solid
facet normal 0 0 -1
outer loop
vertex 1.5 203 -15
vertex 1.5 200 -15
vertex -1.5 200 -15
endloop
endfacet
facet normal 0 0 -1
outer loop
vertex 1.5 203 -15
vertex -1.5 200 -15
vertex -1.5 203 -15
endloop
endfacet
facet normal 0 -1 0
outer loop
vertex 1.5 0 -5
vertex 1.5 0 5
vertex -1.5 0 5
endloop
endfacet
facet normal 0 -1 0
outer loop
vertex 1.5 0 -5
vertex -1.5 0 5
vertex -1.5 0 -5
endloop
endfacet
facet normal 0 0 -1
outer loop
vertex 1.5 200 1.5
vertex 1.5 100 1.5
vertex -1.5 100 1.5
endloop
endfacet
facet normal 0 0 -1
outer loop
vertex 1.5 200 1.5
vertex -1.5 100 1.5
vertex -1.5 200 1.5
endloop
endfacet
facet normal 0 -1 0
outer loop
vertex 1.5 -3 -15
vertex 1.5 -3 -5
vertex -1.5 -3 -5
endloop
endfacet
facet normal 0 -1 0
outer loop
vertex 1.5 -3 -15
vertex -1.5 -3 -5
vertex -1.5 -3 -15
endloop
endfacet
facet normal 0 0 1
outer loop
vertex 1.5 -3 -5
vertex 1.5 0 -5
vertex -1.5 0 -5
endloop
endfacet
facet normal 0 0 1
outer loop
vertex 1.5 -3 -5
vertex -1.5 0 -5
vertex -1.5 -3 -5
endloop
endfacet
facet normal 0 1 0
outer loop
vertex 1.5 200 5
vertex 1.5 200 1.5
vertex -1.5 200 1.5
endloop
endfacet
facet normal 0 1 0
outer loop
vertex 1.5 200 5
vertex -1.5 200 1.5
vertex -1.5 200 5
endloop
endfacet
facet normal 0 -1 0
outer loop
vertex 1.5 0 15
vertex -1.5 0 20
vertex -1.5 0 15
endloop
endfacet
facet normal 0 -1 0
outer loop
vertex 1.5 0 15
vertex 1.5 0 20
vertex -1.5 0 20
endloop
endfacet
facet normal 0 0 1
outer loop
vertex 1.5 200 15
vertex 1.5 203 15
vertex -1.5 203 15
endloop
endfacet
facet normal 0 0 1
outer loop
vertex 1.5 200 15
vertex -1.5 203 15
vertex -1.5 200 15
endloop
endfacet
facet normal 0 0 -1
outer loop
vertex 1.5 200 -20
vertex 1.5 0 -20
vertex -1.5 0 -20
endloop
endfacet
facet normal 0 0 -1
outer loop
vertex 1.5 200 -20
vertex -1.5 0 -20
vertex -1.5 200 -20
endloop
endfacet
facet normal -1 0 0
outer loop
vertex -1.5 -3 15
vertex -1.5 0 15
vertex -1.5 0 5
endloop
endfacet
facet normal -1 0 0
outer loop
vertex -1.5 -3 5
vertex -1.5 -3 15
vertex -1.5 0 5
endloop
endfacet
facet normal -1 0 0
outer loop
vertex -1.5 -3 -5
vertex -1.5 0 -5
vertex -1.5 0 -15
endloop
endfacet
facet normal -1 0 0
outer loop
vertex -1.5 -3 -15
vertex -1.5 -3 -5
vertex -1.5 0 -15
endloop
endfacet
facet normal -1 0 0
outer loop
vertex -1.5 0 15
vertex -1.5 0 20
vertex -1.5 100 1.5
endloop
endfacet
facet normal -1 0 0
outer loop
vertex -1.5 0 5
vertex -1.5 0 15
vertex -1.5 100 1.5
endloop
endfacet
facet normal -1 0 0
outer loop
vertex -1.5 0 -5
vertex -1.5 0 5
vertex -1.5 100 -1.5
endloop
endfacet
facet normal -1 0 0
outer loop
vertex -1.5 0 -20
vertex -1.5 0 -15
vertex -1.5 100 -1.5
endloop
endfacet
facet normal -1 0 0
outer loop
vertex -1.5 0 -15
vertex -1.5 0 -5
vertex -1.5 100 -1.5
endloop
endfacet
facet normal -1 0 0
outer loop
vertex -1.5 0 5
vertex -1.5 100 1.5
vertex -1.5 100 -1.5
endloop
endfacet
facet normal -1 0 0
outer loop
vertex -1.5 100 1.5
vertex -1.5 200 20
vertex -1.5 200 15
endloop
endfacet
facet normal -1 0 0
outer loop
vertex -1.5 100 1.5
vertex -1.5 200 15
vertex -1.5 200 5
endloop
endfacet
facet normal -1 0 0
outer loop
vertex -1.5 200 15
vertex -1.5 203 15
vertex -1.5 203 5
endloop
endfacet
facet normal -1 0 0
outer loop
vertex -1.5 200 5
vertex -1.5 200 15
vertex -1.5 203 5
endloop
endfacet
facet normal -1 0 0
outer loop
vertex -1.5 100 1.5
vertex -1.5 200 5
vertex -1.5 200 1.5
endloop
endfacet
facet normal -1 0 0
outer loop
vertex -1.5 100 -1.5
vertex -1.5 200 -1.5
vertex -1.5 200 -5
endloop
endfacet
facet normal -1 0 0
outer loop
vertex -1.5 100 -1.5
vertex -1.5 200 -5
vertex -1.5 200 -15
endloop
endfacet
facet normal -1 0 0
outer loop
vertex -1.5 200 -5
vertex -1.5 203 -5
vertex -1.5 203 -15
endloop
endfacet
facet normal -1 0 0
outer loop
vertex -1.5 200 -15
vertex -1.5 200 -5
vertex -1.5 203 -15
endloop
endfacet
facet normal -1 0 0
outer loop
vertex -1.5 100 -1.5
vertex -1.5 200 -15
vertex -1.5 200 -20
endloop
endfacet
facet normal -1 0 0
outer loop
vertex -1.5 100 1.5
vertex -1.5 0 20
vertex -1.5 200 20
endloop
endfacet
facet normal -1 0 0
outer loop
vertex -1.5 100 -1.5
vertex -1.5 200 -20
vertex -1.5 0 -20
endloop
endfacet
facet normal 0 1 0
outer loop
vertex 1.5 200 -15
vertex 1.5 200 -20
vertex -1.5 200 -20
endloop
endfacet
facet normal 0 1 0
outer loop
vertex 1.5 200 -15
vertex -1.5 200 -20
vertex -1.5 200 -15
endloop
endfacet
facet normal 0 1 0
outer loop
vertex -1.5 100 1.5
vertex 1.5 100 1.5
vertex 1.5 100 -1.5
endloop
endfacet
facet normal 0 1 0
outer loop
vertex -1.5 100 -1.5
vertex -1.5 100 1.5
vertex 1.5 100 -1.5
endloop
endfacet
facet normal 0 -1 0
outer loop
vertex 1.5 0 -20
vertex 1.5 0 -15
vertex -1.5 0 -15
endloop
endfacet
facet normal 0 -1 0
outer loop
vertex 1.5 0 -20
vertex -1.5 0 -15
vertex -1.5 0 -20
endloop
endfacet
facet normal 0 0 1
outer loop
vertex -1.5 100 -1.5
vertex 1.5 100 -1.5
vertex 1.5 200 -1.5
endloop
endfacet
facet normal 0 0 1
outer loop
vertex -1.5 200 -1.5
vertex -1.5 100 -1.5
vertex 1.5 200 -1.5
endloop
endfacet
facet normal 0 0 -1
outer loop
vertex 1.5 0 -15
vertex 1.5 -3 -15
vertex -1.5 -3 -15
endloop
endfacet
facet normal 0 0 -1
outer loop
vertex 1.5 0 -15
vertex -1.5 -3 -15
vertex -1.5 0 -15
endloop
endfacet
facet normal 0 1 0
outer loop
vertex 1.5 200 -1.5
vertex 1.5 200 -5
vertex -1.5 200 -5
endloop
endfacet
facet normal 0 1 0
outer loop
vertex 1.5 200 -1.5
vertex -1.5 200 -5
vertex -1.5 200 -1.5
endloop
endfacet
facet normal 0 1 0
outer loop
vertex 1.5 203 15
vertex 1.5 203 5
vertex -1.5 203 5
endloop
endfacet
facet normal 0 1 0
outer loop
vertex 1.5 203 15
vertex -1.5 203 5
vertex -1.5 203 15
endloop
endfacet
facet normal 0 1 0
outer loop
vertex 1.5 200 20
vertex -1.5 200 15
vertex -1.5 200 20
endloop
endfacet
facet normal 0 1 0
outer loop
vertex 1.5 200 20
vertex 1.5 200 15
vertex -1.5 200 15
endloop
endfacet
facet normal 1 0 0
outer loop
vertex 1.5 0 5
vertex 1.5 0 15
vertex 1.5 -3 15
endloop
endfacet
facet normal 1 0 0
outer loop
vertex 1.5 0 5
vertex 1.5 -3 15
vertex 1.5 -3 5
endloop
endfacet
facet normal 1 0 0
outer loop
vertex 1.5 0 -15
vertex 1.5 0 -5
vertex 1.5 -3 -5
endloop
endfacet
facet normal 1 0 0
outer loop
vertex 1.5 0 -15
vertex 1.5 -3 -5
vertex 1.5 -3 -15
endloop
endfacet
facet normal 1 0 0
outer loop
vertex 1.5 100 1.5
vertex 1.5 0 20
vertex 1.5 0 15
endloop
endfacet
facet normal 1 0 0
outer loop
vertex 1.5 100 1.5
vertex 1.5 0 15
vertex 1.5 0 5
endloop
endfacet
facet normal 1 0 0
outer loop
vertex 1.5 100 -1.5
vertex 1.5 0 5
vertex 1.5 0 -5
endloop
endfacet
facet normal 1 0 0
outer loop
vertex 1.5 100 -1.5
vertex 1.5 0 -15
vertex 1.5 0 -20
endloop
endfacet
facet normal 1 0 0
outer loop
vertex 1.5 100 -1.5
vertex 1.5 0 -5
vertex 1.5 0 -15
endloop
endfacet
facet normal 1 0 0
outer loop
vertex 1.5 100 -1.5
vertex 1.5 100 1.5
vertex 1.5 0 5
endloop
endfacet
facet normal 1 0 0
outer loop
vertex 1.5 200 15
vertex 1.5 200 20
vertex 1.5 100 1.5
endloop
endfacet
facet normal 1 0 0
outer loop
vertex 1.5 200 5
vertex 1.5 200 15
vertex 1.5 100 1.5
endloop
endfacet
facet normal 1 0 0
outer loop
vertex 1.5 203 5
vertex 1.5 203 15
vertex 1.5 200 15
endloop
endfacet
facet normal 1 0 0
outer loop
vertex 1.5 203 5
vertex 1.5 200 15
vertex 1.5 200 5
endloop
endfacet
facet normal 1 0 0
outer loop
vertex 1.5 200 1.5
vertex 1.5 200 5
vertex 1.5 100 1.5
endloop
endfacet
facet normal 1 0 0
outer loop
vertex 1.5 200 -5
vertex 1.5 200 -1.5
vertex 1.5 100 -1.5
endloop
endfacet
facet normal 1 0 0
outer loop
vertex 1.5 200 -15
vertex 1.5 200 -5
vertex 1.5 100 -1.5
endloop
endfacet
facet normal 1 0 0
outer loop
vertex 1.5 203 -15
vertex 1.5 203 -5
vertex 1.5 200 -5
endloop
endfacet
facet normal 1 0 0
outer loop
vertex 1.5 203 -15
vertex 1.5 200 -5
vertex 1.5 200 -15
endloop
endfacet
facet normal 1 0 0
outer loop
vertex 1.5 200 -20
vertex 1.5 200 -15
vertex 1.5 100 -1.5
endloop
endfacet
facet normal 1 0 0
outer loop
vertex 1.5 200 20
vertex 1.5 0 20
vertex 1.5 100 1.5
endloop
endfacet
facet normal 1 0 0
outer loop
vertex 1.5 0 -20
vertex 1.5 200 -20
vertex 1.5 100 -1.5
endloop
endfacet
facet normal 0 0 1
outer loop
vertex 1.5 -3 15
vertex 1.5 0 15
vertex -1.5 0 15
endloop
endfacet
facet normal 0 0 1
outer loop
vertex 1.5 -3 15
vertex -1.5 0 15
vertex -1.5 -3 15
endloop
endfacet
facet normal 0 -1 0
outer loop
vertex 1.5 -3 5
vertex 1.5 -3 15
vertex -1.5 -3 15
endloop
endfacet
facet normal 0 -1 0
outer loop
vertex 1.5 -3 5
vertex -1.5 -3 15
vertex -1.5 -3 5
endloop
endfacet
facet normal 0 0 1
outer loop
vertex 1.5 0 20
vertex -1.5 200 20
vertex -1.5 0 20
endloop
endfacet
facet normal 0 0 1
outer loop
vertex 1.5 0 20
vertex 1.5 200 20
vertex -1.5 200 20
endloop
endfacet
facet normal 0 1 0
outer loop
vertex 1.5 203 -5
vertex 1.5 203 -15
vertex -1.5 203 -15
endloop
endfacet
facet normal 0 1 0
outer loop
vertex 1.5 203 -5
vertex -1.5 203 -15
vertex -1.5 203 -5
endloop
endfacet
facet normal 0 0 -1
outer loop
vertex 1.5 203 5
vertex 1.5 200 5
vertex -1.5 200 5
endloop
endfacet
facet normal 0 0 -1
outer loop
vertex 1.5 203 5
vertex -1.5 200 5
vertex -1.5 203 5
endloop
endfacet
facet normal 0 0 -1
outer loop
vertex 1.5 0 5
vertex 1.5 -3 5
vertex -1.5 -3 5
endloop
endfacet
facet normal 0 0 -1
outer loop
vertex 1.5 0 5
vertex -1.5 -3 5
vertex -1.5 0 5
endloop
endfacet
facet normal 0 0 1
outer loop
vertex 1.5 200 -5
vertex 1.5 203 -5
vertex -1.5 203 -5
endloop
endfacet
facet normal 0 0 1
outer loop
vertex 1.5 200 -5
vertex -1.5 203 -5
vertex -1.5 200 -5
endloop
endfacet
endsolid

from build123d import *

# Parameters (mm, degrees)
SALIENTE_EXTRUIR1_DEPTH = 1.5
CORTAR_EXTRUIR1_REACH   = 5
CROQUIS2_W              = 3
CROQUIS2_H              = 100


with BuildPart() as part:
    # Croquis1 → Saliente-Extruir1 (new body, symmetric)
    with BuildSketch(Plane(origin=(0, 0, 0), x_dir=(0, 0, -1), z_dir=(1, 0, 0))):
        Polygon((-20, 0), (-15, 0), (-15, -3), (-5, -3), (-5, 0), (5, 0), (5, -3), (15, -3), (15, 0), (20, 0), (20, 200), (15, 200), (15, 203), (5, 203), (5, 200), (-5, 200), (-5, 203), (-15, 203), (-15, 200), (-20, 200), align=None)
    extrude(amount=SALIENTE_EXTRUIR1_DEPTH, both=True)

    # Croquis2 → Cortar-Extruir1 (cut, up to next)
    with BuildSketch(Plane(origin=(1.5, 0, 0), x_dir=(0, 0, -1), z_dir=(1, 0, 0)), mode=Mode.PRIVATE) as cortar_extruir1_sk1:
        with Locations((0, 150)):
            Rectangle(CROQUIS2_W, CROQUIS2_H)
    cortar_extruir1_tool1 = extrude(cortar_extruir1_sk1.sketch, amount=-CORTAR_EXTRUIR1_REACH, mode=Mode.PRIVATE) & part.part
    add(cortar_extruir1_tool1.solids().sort_by_distance((1.5, 150, 0))[0], mode=Mode.SUBTRACT)


solid = part.part
